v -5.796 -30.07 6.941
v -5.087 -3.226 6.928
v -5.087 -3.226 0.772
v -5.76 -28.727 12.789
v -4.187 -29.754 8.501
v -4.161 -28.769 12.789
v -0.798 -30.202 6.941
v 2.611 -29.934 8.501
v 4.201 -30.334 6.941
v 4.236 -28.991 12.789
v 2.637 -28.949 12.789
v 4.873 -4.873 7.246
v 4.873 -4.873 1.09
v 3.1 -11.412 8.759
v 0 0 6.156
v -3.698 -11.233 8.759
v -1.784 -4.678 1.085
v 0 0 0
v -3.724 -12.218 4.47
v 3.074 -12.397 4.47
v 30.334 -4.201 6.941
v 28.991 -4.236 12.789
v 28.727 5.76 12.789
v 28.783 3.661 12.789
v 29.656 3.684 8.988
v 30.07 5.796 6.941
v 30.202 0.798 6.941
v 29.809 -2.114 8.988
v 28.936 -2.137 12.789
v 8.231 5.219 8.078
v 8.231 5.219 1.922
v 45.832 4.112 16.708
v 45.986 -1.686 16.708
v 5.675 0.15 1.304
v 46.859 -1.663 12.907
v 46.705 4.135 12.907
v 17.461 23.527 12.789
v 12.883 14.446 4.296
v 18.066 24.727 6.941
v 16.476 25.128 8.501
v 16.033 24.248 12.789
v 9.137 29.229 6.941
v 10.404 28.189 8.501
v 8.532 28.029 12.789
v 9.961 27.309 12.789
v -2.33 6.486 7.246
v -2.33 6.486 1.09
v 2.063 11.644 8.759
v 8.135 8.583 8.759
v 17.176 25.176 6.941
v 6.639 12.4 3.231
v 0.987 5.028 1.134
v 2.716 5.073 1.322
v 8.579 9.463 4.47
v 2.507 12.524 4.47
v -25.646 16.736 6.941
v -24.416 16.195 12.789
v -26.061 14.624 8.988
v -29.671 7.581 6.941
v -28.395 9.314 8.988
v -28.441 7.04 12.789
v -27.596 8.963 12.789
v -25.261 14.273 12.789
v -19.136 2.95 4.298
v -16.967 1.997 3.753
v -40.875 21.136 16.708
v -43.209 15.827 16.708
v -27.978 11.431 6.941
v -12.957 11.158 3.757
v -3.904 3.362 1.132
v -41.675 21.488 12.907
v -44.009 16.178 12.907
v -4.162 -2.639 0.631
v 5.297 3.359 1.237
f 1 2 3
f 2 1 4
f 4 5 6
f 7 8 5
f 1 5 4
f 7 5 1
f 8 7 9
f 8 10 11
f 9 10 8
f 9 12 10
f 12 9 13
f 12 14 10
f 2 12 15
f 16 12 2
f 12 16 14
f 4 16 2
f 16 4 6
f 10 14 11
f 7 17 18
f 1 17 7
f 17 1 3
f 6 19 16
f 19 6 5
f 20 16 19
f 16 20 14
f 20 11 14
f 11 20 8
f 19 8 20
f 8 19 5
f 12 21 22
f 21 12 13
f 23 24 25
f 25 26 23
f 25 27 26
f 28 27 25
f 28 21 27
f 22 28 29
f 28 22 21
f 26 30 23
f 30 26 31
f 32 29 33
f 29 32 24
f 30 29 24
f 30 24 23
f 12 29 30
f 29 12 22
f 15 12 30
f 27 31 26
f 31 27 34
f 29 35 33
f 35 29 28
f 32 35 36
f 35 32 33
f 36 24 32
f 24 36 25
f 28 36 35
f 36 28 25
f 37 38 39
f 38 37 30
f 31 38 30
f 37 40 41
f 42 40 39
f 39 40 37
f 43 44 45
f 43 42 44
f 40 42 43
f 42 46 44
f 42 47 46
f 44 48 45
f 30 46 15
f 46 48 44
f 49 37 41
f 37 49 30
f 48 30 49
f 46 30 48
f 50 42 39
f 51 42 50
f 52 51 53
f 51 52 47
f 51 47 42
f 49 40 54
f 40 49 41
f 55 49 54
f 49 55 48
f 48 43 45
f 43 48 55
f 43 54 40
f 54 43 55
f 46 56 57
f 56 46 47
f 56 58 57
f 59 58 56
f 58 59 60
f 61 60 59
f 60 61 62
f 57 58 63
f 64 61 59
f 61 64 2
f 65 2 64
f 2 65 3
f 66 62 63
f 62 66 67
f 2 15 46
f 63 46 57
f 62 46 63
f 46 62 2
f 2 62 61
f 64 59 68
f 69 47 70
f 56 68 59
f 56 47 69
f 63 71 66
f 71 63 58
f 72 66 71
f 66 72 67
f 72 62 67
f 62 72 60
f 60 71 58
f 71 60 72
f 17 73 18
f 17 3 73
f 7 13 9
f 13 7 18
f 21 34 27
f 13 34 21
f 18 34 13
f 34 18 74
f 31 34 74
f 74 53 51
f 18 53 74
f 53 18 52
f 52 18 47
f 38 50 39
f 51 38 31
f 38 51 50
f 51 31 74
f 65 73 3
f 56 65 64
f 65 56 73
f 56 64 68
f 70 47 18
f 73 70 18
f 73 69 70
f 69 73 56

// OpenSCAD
$fn = 128; // smoothness

vertex();
// pipe_holder_cuff();

main_vertex = [1, 1, 4.2360679775];
u = main_vertex / norm(main_vertex);
e_y = [0,1,0];
e_z = [0,0,1];

adjacent_verticies = [
  [1, -1, 4.2360679775],
  [-1, 1, 4.2360679775],
  [0, 2.61803398875, 3.61803398875],
  [2.61803398875, 1.61803398875, 3.2360679775],
];


gap = 0.5;
wall_thickness = 1.6;

MIRROR = 1;

socket_radius = 21; // For 1.25" schedule 40 PVC pipe
pipe_holder_depth = 12;
pipe_holder_thickness = 3;

cube_dims = [10, 6, 31];
female_dims = [
  cube_dims[0] - 2*wall_thickness,
  cube_dims[1] - wall_thickness,
  18
];
male_dims = female_dims - gap*[2,1,1];

center_length = 2*cube_dims[2] * norm(main_vertex) / norm(adjacent_verticies[0] - main_vertex);
echo(center_length);


module pipe_holder_cuff() {
  difference() {
    cylinder(r=socket_radius + 2*pipe_holder_thickness, h=pipe_holder_depth + pipe_holder_thickness - 1);

    cylinder(r=socket_radius+0.5, h=100);

    translate([0, 0, pipe_holder_thickness])
    cylinder(r=socket_radius + pipe_holder_thickness + 1, h=100);
  }
}

module vertex() {

  a = -atan2(sqrt(2), main_vertex[2]);
  mirror([MIRROR,0,0])
  rotate(v=[1,-1,0], a=a)
  difference() {
    union() {
      edges();
    }

    edges_negative();
  }

  module edges() {
    for(i = [0:3]) {
      v = adjacent_verticies[i];
      e = (v - main_vertex) / 2;
      
      
      xy = [e[0], e[1], 0];
      a0 = acos((xy * e_y) / norm(xy)) * (e[0] < 0 ? 1:-1);
      
      c = cross(e_z, e);
      a1 = asin(norm(c));
      
      o_p1 = u - (u * e) * e;
      o_p2 = e_z - (e_z * e) * e;
      a2 = acos((o_p1 * o_p2) / norm(o_p1) / norm(o_p2)) * (e[0] < 0 ? -1:1);
      
      rotate(v=c, a=a1)
      rotate(v=[0,0,1], a=a2 + a0 + 180) {
        edge(i%2 == MIRROR);
      }
    }
  }
  
  module edge(male) {
    if (male) {
      union() {
        body();
        
        translate([
            -male_dims[0]/2,
            cube_dims[1] - male_dims[1],
            cube_dims[2]
        ]) {
          cube(male_dims);
        }
      }
    } else {
      difference() {
        body();
        
        translate([
            -female_dims[0]/2,
            cube_dims[1] - female_dims[1],
            cube_dims[2] - female_dims[2]
        ]) {
          cube(female_dims);
        }
      }
    }
    
    module body() {
      translate([-cube_dims[0]/2, 0, 0]) {
        cube(cube_dims);
      }
    }
  }
  
  module edges_negative() {
    for(v = adjacent_verticies) {
      e = (v - main_vertex) / 2;
      
      
      xy = [e[0], e[1], 0];
      a0 = acos((xy * e_y) / norm(xy)) * (e[0] < 0 ? 1:-1);
      
      c = cross(e_z, e);
      a1 = asin(norm(c));
      
      o_p1 = u - (u * e) * e;
      o_p2 = e_z - (e_z * e) * e;
      a2 = acos((o_p1 * o_p2) / norm(o_p1) / norm(o_p2)) * (e[0] < 0 ? -1:1);
      
      rotate(v=c, a=a1)
      rotate(v=[0,0,1], a=a2 + a0 + 180)
      translate([-cube_dims[0]/2, -cube_dims[1], 0]) {
        cube(cube_dims);
      }
    }
  }
}
